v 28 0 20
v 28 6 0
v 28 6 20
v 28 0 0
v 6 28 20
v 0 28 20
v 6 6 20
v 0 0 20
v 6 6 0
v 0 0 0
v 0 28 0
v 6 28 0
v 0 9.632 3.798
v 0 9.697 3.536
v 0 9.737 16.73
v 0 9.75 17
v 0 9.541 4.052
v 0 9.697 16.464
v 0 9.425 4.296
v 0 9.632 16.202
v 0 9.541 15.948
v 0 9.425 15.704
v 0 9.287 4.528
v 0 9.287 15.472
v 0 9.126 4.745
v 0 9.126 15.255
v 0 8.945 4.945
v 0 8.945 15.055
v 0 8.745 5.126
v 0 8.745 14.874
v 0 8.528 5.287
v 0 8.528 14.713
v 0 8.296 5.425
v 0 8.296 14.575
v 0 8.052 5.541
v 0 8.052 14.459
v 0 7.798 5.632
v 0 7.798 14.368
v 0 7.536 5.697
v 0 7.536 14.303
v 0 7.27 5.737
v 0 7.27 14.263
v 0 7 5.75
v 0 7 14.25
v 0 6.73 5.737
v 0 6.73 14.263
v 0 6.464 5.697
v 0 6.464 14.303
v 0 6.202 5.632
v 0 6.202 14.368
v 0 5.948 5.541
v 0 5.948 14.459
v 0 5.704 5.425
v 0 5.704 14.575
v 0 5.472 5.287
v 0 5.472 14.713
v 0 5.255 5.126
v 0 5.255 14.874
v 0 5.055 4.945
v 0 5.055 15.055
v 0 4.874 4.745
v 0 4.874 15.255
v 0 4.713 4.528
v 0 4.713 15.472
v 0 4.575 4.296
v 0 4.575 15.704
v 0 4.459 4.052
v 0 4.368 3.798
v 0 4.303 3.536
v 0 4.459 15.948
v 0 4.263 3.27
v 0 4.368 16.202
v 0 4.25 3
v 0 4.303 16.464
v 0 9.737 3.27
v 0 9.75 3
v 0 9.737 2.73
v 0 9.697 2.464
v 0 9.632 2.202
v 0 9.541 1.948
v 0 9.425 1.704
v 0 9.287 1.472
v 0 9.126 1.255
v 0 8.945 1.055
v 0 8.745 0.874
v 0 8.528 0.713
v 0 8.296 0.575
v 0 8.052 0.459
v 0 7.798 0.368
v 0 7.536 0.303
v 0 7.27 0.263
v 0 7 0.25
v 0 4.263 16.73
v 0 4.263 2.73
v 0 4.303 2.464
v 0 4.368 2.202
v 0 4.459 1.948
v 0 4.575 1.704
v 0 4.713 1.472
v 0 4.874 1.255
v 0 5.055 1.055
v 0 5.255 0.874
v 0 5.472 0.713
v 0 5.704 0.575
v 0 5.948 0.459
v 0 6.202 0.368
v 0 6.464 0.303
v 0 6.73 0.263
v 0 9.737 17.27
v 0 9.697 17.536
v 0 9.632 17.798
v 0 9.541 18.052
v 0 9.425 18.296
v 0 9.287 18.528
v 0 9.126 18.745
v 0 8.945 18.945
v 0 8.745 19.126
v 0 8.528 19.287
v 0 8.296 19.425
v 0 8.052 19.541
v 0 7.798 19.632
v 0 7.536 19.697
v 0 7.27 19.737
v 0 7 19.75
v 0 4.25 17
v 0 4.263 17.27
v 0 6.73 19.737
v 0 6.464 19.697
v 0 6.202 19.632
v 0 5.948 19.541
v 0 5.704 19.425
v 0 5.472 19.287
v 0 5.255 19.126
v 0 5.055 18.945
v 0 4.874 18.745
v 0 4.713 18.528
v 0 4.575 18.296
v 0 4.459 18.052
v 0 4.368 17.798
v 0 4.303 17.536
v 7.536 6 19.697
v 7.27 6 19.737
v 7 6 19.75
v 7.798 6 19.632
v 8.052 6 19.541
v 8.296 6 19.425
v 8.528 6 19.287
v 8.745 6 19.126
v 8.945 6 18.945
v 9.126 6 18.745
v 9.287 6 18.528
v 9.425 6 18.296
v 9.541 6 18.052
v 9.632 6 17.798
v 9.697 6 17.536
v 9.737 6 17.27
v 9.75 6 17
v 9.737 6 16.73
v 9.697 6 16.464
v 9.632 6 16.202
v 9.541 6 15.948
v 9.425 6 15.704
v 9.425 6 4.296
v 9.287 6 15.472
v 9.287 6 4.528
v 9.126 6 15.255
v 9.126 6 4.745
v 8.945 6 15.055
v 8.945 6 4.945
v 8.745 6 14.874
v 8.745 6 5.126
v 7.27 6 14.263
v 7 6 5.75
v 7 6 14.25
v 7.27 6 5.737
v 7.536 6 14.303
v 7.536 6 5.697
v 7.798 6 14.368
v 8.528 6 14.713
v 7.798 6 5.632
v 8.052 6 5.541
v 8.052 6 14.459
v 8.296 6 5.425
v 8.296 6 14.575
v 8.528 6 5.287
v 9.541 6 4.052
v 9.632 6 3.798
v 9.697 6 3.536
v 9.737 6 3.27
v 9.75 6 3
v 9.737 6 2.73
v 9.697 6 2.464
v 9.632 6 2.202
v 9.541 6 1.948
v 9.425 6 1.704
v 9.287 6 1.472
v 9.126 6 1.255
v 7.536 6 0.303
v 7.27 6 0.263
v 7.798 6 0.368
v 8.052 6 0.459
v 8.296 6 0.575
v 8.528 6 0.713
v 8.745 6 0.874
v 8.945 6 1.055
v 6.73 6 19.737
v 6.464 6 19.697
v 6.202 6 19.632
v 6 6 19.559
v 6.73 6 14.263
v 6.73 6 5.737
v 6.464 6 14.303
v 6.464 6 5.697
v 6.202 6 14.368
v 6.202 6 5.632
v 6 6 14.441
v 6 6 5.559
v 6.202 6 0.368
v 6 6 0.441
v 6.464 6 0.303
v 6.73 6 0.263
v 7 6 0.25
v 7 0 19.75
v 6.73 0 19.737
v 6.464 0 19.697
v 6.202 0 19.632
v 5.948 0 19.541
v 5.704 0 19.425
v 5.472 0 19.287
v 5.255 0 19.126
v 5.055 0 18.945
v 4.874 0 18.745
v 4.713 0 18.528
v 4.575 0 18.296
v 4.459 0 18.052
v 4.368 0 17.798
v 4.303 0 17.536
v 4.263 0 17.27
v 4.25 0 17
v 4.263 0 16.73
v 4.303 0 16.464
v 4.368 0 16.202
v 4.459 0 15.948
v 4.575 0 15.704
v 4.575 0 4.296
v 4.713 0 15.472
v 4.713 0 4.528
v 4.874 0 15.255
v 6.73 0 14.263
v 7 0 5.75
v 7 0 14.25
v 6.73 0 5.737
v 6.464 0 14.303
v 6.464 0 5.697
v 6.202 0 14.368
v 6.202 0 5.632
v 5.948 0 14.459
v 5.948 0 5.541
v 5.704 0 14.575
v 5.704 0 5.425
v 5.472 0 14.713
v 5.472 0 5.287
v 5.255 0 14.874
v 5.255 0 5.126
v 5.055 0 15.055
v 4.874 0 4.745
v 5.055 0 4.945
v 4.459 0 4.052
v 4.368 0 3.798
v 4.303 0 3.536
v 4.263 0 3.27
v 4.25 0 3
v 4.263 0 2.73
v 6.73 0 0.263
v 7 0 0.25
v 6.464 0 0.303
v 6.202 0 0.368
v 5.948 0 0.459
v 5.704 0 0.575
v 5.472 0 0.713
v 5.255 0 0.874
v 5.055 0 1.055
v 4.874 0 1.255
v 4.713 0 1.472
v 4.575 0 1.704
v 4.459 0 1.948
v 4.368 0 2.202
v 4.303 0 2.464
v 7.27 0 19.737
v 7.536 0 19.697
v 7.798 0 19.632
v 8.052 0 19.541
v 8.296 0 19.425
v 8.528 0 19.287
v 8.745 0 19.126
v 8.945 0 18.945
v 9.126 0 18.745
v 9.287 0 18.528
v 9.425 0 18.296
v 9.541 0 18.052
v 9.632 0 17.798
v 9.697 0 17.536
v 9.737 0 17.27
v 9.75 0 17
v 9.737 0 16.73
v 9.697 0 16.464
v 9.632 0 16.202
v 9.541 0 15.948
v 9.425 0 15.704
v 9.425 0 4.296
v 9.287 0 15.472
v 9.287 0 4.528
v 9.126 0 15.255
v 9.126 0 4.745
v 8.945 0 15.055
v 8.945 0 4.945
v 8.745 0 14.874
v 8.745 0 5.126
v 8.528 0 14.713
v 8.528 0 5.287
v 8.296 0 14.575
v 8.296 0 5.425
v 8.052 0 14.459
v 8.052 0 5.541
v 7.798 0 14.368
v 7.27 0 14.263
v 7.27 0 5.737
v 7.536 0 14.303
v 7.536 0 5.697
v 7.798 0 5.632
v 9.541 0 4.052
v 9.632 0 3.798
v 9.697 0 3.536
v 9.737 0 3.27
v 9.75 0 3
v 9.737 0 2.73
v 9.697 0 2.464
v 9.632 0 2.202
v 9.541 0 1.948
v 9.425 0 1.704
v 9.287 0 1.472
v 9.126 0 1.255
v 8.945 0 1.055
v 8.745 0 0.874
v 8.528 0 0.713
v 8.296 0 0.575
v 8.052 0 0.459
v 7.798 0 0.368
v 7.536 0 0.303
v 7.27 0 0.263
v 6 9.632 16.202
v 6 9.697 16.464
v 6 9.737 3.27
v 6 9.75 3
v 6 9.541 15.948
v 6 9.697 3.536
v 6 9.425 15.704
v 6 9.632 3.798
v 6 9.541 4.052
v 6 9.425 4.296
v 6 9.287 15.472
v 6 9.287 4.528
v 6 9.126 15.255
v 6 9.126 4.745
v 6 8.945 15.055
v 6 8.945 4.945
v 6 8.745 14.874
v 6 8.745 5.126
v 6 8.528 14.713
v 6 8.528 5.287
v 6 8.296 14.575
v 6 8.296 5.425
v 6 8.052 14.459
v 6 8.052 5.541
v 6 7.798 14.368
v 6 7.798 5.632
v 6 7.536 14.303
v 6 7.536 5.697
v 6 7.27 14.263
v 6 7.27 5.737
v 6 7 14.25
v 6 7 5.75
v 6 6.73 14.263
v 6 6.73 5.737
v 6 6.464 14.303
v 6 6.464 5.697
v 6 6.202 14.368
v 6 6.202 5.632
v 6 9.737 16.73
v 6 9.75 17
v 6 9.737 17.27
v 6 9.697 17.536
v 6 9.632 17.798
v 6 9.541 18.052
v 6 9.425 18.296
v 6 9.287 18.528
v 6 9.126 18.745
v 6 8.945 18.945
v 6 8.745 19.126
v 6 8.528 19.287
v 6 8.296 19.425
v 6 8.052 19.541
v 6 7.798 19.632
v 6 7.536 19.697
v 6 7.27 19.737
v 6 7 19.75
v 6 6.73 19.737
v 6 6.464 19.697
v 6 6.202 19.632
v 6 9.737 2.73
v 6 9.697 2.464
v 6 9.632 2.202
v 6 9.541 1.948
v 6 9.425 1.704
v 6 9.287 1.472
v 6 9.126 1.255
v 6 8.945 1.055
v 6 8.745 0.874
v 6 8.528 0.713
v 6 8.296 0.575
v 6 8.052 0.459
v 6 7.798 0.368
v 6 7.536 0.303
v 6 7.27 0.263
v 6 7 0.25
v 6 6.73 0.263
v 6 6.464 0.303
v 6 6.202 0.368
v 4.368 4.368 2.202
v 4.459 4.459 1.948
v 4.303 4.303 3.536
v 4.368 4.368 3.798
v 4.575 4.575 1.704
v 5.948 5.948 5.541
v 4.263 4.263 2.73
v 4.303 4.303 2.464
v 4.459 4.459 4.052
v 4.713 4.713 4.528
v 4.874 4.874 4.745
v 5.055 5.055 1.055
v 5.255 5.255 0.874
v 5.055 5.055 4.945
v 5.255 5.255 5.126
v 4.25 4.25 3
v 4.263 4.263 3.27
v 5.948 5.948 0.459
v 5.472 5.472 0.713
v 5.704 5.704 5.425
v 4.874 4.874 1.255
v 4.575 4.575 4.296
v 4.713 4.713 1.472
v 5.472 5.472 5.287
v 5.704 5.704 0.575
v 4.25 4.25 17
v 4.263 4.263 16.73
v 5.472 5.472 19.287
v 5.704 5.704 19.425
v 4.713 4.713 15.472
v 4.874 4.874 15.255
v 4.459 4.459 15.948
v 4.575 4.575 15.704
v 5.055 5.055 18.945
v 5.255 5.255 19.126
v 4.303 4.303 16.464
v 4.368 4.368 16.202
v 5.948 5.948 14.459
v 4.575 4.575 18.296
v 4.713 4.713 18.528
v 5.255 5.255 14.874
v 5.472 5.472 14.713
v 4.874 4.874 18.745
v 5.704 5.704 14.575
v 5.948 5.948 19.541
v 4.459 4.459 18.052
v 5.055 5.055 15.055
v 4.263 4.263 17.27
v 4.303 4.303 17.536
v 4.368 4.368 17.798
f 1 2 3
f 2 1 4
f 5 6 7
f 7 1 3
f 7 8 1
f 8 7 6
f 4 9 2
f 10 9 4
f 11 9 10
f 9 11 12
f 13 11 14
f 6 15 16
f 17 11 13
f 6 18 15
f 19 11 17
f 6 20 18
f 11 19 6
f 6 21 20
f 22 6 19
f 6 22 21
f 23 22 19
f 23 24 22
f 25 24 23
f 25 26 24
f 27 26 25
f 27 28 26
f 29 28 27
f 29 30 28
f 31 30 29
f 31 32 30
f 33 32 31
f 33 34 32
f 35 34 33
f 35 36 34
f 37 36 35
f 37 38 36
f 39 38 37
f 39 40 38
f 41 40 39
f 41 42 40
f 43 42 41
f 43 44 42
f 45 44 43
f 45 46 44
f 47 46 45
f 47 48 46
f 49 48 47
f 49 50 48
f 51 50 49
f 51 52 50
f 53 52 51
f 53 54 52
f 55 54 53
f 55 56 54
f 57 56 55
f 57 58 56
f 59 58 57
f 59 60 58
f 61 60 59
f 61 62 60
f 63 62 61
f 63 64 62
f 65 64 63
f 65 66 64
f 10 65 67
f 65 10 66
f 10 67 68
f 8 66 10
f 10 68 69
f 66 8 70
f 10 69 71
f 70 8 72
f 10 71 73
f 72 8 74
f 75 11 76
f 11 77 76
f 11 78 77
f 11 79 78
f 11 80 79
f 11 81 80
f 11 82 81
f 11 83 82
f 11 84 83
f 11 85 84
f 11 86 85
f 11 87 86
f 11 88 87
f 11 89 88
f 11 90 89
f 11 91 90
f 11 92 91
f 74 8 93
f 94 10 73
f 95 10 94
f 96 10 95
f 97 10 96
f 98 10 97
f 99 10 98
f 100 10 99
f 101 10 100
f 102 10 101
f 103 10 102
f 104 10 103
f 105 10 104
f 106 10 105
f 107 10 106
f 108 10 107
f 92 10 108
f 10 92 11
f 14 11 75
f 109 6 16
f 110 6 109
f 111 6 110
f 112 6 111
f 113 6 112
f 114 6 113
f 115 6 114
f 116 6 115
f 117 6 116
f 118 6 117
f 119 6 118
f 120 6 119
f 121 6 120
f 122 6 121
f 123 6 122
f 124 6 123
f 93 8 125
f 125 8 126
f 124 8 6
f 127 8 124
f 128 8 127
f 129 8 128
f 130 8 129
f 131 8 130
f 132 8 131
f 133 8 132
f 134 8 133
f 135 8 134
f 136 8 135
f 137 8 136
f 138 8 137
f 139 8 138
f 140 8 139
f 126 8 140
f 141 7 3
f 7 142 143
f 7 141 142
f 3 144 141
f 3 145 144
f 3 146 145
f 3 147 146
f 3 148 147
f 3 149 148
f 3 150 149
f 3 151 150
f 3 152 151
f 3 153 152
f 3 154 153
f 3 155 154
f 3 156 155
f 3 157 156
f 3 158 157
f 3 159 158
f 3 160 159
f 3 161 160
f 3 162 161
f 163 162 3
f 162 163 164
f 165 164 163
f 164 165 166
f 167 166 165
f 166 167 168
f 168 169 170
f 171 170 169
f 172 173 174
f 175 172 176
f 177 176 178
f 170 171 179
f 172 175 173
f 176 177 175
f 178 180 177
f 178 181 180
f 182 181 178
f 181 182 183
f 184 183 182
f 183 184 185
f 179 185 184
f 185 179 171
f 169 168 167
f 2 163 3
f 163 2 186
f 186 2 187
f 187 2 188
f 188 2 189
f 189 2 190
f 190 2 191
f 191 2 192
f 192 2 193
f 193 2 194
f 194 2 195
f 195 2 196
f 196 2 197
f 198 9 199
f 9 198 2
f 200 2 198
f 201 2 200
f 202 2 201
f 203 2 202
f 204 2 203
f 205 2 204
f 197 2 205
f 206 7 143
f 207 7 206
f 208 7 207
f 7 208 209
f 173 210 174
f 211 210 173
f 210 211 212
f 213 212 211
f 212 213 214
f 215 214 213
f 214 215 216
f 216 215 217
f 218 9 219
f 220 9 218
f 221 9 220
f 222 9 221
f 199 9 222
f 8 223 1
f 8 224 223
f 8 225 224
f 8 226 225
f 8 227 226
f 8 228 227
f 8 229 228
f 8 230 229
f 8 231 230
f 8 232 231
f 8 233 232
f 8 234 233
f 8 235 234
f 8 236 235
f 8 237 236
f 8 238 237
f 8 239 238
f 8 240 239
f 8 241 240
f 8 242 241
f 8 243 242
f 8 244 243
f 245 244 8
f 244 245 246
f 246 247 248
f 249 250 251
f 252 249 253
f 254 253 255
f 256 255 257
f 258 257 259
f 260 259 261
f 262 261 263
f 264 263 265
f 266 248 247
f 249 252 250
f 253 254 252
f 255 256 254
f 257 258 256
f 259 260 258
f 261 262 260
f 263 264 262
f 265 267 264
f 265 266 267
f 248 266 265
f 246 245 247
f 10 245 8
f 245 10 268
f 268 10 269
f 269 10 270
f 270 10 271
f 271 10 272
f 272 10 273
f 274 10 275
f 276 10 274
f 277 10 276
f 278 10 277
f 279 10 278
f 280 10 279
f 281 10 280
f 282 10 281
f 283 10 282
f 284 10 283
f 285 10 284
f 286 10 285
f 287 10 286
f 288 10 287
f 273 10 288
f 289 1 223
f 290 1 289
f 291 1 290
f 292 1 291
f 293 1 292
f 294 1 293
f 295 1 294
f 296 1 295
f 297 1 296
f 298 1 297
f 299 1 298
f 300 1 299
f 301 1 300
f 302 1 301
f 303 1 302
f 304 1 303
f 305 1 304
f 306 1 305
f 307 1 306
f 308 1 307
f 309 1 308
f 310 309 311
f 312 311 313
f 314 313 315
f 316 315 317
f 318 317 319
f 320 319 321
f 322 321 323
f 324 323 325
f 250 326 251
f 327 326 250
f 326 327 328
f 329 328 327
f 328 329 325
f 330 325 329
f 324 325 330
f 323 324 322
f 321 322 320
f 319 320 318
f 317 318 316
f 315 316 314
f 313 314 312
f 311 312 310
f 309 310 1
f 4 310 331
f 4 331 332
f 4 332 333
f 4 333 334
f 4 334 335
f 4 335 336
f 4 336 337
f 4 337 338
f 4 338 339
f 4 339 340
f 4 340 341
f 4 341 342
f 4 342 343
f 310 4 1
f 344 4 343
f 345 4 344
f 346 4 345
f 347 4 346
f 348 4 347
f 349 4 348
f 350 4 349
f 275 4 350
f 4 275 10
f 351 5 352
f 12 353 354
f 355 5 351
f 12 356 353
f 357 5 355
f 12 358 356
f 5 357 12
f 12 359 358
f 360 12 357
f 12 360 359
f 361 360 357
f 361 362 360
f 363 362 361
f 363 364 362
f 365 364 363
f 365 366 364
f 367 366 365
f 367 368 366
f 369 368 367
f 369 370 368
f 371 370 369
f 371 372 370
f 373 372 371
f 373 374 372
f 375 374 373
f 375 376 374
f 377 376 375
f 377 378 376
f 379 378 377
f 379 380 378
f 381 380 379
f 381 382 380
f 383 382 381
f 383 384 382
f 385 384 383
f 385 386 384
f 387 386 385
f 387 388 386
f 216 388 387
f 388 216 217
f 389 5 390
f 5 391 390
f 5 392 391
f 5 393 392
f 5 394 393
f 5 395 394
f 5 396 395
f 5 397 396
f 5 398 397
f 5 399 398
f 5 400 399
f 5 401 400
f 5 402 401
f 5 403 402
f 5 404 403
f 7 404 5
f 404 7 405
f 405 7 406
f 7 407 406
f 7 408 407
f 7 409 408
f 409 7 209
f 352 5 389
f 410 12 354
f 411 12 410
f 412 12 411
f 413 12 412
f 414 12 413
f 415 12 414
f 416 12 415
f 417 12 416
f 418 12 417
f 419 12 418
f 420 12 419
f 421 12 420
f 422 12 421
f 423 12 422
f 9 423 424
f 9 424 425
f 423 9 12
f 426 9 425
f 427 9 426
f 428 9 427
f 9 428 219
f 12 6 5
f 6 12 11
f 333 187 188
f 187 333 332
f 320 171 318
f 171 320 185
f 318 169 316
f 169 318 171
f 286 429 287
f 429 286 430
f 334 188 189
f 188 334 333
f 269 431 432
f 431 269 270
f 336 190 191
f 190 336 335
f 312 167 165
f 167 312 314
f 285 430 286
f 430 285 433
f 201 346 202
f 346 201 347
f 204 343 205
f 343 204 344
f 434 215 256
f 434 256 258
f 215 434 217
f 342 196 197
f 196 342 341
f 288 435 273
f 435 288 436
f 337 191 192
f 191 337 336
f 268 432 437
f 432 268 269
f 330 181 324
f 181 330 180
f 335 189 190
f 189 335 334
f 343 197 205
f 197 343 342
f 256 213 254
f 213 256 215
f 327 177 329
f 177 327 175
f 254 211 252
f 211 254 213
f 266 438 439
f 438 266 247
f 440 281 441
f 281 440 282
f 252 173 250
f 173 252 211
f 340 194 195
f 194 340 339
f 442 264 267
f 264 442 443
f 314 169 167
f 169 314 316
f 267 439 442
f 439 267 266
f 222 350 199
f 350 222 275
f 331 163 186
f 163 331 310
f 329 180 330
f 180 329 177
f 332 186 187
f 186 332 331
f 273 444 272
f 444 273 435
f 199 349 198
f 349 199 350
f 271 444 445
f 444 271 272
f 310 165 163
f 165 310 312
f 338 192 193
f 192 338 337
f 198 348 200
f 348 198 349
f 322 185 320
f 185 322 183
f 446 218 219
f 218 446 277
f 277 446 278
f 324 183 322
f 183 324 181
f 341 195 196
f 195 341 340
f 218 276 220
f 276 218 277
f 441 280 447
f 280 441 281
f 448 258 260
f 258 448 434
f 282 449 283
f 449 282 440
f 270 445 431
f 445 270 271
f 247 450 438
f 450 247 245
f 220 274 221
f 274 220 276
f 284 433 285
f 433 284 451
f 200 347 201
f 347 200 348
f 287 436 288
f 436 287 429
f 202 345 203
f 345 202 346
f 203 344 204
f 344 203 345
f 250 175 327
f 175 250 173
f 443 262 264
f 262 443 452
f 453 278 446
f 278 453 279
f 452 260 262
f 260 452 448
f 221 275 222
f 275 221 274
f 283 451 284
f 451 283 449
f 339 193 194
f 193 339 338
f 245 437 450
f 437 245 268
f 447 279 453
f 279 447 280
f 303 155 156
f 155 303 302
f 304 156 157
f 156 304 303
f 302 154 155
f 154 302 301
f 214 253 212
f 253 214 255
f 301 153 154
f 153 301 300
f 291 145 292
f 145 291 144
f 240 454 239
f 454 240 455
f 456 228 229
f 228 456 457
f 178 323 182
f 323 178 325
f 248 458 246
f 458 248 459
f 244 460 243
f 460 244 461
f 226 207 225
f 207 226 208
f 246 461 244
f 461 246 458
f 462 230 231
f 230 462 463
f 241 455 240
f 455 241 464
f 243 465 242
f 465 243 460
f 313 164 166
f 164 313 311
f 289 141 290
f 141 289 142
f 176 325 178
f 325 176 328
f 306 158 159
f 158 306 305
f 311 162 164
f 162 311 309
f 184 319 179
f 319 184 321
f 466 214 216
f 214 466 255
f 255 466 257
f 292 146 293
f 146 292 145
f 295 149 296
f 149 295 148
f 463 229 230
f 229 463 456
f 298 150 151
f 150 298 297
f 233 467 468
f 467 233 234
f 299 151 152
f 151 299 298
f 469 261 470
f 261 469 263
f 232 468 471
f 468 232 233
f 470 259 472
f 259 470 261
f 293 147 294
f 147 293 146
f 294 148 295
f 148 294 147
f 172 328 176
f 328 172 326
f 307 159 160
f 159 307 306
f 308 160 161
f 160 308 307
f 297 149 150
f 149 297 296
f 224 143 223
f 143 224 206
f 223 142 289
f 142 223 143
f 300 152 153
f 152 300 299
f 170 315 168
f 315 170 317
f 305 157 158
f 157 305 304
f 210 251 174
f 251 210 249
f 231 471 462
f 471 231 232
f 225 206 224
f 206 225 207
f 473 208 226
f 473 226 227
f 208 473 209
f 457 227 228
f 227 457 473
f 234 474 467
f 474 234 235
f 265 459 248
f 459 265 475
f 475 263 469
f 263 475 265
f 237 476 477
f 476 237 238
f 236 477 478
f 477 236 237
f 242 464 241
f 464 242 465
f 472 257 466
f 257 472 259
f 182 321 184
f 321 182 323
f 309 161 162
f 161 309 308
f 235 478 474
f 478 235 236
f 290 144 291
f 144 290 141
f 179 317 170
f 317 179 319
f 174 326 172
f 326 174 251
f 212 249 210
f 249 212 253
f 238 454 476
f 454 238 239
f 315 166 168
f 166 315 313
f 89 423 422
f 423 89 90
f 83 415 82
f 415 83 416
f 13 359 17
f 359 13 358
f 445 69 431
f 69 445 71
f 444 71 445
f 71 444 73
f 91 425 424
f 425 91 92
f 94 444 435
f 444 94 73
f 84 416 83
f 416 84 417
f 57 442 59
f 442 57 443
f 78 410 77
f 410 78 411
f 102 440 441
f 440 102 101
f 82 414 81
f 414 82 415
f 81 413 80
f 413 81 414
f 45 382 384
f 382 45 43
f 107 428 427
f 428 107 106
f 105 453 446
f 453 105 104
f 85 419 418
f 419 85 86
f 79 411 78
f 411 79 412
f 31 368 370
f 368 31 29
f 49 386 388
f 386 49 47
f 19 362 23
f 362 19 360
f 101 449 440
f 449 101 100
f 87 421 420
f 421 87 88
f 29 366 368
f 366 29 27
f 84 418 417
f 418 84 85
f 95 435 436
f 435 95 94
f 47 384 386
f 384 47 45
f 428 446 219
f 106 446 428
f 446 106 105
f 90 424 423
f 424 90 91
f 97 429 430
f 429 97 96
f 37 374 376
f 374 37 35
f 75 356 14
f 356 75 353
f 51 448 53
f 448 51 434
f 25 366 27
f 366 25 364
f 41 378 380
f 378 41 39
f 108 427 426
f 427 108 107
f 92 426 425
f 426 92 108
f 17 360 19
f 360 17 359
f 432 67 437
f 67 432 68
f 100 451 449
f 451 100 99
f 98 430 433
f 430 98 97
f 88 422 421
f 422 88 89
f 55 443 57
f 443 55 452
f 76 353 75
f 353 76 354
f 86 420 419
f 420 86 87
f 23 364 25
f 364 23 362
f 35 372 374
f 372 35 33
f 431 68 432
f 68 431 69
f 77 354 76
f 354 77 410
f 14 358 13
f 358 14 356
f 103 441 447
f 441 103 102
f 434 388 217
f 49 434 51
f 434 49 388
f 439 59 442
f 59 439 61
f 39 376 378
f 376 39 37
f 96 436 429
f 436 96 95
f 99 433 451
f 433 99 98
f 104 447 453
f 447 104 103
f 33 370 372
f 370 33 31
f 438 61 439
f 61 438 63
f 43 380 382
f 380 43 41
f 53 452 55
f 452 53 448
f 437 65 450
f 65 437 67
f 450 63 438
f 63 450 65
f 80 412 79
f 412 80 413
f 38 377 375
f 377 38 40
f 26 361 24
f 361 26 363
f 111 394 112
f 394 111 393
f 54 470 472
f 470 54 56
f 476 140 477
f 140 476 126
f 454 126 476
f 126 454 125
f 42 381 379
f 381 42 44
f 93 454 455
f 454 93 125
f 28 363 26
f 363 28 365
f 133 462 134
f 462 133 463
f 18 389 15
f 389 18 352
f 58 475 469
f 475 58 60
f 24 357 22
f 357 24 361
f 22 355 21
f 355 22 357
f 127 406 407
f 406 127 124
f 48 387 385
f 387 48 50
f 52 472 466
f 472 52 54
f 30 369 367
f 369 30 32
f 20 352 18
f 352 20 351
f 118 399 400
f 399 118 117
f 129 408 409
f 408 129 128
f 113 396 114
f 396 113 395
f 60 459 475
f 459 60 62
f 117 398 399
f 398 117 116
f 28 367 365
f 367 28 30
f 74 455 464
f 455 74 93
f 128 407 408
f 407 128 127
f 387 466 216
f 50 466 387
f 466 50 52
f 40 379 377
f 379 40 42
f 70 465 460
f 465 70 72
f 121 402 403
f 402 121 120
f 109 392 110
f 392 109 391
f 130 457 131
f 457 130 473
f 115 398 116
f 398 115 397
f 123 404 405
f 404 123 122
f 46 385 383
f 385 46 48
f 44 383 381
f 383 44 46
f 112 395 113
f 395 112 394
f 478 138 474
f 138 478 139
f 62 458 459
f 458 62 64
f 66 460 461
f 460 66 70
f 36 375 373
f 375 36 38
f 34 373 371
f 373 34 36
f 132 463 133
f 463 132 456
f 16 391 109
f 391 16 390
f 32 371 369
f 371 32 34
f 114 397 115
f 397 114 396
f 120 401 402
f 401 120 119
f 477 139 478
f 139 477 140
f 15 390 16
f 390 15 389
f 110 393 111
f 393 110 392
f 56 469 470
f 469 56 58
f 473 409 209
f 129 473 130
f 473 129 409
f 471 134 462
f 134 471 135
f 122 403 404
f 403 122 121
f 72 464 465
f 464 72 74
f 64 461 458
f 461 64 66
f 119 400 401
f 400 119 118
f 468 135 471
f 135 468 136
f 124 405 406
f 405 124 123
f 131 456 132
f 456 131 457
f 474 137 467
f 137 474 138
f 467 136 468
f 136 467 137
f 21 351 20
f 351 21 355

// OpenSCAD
// A extrusion bracket target overall size: [28, 28, 20]
// Standalone bracket only (no extrusions, no floating markers). One connected solid.

footprint_x = 28;          // overall X
footprint_y = 28;          // overall Y
height_z    = 20;          // overall Z

leg_thickness = 6;         // wall/leg thickness (in X and Y)
hole_diameter = 5.5;
hole_edge_margin = 7;      // from outer edge along the leg length
hole_spacing = 14;         // spacing along Z between the two holes per face
overlap = 0.6;             // small overlap for robust booleans

// Internal relief (corner clearance)
internal_relief_margin = 2;
internal_relief_depth  = 12;
internal_relief_height = 16;

$fn = 64;

module bracket_body() {
    // L-shaped solid that fits within [footprint_x, footprint_y, height_z]
    // Built from two legs that overlap in the corner to ensure connectivity.
    union() {
        // X-leg: runs along +X from the corner, thickness in Y
        translate([footprint_x/2, leg_thickness/2, height_z/2])
            cube([footprint_x, leg_thickness, height_z], center=true);

        // Y-leg: runs along +Y from the corner, thickness in X
        translate([leg_thickness/2, footprint_y/2, height_z/2])
            cube([leg_thickness, footprint_y, height_z], center=true);
    }
}

module internal_relief_cut() {
    // Remove material near the inside corner (top portion), leaving a connected bracket.
    // Positioned from the inside corner at (leg_thickness, leg_thickness).
    translate([
        leg_thickness + internal_relief_margin + internal_relief_depth/2,
        leg_thickness + internal_relief_margin + internal_relief_depth/2,
        height_z - internal_relief_height/2
    ])
        cube([internal_relief_depth, internal_relief_depth, internal_relief_height + 2*overlap], center=true);
}

module holes_cut() {
    // Two holes through the Y-thickness of the X-leg (drill along Y)
    for (zpos = [height_z/2 - hole_spacing/2, height_z/2 + hole_spacing/2]) {
        translate([hole_edge_margin, leg_thickness/2, zpos])
            rotate([90, 0, 0])
                cylinder(h=leg_thickness + 2*overlap, r=hole_diameter/2, center=true);
    }

    // Two holes through the X-thickness of the Y-leg (drill along X)
    for (zpos = [height_z/2 - hole_spacing/2, height_z/2 + hole_spacing/2]) {
        translate([leg_thickness/2, hole_edge_margin, zpos])
            rotate([0, 90, 0])
                cylinder(h=leg_thickness + 2*overlap, r=hole_diameter/2, center=true);
    }
}

difference() {
    bracket_body();
    internal_relief_cut();
    holes_cut();
}
